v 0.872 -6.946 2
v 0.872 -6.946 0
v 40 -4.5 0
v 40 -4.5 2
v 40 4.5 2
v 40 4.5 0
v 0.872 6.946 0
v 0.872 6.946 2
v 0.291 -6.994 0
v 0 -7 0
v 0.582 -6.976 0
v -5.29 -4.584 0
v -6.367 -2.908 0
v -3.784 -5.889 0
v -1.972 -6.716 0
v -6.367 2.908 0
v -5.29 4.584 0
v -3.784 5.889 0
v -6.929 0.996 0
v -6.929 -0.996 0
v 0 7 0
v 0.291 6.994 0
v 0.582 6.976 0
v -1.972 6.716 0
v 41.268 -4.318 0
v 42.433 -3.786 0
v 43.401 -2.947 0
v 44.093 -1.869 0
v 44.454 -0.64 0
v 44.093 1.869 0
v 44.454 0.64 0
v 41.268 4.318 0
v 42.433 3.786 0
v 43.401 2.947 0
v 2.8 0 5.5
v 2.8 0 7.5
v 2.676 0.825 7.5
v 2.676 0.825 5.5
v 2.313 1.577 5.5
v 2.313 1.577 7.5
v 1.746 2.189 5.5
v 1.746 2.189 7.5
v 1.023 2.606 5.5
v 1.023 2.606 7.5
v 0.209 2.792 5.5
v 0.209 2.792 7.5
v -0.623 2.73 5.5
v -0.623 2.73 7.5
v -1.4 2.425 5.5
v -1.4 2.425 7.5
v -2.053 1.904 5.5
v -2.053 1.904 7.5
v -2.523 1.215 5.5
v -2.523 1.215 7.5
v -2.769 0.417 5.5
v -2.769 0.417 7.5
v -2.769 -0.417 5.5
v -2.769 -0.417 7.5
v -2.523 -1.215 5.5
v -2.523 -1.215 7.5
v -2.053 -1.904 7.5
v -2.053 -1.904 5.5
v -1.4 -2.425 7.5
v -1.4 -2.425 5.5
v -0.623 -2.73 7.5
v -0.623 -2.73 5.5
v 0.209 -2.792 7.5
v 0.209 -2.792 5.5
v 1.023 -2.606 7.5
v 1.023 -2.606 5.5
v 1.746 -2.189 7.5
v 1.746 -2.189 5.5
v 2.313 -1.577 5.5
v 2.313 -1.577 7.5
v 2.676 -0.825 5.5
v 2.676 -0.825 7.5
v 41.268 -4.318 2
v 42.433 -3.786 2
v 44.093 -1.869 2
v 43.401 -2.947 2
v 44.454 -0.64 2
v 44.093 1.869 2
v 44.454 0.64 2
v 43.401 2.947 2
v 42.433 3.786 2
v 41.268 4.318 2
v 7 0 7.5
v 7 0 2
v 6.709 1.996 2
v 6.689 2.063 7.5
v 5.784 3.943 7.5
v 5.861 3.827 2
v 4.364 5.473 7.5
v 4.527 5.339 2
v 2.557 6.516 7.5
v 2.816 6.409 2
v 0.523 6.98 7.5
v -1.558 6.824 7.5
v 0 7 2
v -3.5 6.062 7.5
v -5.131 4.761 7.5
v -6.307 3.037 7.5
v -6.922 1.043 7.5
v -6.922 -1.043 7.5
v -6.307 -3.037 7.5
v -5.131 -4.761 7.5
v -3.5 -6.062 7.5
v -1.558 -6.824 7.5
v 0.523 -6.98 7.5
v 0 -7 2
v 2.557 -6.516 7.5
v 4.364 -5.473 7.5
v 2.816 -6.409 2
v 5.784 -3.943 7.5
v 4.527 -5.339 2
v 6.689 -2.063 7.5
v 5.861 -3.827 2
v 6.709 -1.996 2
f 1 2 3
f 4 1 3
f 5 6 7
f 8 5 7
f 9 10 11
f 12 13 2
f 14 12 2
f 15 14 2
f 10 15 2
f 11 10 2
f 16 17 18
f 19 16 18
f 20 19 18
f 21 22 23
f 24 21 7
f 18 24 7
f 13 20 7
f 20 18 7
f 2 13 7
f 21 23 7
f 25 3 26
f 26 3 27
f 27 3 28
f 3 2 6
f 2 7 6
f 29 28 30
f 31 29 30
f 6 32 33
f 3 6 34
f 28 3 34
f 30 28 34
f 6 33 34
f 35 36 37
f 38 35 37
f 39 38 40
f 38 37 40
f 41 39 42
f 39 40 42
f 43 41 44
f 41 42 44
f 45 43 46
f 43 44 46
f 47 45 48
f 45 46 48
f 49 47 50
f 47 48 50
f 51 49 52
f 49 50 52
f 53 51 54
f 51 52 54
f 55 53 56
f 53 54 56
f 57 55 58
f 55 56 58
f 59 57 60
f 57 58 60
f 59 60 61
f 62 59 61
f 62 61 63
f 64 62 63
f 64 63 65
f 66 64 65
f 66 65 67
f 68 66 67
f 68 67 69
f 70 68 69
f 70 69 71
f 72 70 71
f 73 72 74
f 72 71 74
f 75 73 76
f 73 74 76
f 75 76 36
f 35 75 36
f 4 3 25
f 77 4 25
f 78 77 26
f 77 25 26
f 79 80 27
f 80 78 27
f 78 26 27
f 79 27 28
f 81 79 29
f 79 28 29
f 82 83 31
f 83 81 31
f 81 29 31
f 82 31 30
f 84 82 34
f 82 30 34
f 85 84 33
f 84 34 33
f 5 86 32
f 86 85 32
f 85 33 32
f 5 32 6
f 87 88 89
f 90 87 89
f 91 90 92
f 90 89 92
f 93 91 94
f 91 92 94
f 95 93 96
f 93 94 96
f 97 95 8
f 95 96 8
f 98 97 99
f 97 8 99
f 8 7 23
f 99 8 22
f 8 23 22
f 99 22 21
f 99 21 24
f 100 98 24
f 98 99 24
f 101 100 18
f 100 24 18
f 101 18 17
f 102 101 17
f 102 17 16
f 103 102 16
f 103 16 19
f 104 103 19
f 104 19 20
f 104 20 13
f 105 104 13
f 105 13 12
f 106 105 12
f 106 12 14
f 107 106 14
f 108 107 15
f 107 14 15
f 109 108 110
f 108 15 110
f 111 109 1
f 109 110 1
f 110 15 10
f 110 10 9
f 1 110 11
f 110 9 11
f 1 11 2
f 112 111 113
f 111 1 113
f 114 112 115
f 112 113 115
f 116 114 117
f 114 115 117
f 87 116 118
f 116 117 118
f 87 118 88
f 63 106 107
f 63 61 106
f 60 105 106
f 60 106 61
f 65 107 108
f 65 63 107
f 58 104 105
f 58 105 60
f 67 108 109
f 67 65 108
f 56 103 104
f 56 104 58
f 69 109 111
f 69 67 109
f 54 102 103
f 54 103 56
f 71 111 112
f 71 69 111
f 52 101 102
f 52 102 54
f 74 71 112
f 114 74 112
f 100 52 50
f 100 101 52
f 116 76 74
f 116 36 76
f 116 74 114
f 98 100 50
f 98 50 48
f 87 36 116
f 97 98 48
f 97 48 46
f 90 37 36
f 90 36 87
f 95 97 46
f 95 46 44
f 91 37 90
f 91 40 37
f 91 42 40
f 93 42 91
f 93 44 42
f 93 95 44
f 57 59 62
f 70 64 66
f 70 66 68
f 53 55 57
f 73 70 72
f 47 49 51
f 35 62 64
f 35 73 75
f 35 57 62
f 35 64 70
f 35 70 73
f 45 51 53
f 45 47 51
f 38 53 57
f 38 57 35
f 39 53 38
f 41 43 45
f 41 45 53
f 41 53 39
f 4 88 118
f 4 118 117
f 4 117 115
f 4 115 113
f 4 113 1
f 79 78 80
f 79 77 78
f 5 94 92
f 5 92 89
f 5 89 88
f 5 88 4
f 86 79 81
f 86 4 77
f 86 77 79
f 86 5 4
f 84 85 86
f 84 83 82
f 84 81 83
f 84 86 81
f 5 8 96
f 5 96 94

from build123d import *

# Parameters (mm, degrees)
SKETCH002_R      = 4.5
EXTRUDE002_DEPTH = 2
SKETCH_R         = 7
EXTRUDE001_DEPTH = 7.5
EXTRUDE_DEPTH    = 2
SKETCH003_R      = 2.8
POCKET_DEPTH     = 2


with BuildPart() as extrudehead:
    # Sketch002 → Extrude002 (new body)
    with BuildSketch(Plane.XY):
        with Locations((40, 0)):
            Circle(SKETCH002_R)
    extrude(amount=EXTRUDE002_DEPTH)


with BuildPart() as extrudemount:
    # Sketch → Extrude001 (new body)
    with BuildSketch(Plane.XY):
        Circle(SKETCH_R)
    extrude(amount=EXTRUDE001_DEPTH)


with BuildPart() as body:
    # Sketch001 (on Sketch) → Extrude (new body)
    with BuildSketch(Plane.XY):
        Polygon((40, 4.5), (0, 7), (0, -7), (40, -4.5), align=None)
    extrude(amount=EXTRUDE_DEPTH)

    # Fusion: union ExtrudeMount
    add(extrudemount.part)

    # Fusion001: union ExtrudeHead
    add(extrudehead.part)

    # Sketch003 (on Face16 of Fusion001) → Pocket (cut)
    with BuildSketch(Plane.XY.offset(7.5)):
        Circle(SKETCH003_R)
    extrude(amount=-POCKET_DEPTH, mode=Mode.SUBTRACT)


solid = body.part
